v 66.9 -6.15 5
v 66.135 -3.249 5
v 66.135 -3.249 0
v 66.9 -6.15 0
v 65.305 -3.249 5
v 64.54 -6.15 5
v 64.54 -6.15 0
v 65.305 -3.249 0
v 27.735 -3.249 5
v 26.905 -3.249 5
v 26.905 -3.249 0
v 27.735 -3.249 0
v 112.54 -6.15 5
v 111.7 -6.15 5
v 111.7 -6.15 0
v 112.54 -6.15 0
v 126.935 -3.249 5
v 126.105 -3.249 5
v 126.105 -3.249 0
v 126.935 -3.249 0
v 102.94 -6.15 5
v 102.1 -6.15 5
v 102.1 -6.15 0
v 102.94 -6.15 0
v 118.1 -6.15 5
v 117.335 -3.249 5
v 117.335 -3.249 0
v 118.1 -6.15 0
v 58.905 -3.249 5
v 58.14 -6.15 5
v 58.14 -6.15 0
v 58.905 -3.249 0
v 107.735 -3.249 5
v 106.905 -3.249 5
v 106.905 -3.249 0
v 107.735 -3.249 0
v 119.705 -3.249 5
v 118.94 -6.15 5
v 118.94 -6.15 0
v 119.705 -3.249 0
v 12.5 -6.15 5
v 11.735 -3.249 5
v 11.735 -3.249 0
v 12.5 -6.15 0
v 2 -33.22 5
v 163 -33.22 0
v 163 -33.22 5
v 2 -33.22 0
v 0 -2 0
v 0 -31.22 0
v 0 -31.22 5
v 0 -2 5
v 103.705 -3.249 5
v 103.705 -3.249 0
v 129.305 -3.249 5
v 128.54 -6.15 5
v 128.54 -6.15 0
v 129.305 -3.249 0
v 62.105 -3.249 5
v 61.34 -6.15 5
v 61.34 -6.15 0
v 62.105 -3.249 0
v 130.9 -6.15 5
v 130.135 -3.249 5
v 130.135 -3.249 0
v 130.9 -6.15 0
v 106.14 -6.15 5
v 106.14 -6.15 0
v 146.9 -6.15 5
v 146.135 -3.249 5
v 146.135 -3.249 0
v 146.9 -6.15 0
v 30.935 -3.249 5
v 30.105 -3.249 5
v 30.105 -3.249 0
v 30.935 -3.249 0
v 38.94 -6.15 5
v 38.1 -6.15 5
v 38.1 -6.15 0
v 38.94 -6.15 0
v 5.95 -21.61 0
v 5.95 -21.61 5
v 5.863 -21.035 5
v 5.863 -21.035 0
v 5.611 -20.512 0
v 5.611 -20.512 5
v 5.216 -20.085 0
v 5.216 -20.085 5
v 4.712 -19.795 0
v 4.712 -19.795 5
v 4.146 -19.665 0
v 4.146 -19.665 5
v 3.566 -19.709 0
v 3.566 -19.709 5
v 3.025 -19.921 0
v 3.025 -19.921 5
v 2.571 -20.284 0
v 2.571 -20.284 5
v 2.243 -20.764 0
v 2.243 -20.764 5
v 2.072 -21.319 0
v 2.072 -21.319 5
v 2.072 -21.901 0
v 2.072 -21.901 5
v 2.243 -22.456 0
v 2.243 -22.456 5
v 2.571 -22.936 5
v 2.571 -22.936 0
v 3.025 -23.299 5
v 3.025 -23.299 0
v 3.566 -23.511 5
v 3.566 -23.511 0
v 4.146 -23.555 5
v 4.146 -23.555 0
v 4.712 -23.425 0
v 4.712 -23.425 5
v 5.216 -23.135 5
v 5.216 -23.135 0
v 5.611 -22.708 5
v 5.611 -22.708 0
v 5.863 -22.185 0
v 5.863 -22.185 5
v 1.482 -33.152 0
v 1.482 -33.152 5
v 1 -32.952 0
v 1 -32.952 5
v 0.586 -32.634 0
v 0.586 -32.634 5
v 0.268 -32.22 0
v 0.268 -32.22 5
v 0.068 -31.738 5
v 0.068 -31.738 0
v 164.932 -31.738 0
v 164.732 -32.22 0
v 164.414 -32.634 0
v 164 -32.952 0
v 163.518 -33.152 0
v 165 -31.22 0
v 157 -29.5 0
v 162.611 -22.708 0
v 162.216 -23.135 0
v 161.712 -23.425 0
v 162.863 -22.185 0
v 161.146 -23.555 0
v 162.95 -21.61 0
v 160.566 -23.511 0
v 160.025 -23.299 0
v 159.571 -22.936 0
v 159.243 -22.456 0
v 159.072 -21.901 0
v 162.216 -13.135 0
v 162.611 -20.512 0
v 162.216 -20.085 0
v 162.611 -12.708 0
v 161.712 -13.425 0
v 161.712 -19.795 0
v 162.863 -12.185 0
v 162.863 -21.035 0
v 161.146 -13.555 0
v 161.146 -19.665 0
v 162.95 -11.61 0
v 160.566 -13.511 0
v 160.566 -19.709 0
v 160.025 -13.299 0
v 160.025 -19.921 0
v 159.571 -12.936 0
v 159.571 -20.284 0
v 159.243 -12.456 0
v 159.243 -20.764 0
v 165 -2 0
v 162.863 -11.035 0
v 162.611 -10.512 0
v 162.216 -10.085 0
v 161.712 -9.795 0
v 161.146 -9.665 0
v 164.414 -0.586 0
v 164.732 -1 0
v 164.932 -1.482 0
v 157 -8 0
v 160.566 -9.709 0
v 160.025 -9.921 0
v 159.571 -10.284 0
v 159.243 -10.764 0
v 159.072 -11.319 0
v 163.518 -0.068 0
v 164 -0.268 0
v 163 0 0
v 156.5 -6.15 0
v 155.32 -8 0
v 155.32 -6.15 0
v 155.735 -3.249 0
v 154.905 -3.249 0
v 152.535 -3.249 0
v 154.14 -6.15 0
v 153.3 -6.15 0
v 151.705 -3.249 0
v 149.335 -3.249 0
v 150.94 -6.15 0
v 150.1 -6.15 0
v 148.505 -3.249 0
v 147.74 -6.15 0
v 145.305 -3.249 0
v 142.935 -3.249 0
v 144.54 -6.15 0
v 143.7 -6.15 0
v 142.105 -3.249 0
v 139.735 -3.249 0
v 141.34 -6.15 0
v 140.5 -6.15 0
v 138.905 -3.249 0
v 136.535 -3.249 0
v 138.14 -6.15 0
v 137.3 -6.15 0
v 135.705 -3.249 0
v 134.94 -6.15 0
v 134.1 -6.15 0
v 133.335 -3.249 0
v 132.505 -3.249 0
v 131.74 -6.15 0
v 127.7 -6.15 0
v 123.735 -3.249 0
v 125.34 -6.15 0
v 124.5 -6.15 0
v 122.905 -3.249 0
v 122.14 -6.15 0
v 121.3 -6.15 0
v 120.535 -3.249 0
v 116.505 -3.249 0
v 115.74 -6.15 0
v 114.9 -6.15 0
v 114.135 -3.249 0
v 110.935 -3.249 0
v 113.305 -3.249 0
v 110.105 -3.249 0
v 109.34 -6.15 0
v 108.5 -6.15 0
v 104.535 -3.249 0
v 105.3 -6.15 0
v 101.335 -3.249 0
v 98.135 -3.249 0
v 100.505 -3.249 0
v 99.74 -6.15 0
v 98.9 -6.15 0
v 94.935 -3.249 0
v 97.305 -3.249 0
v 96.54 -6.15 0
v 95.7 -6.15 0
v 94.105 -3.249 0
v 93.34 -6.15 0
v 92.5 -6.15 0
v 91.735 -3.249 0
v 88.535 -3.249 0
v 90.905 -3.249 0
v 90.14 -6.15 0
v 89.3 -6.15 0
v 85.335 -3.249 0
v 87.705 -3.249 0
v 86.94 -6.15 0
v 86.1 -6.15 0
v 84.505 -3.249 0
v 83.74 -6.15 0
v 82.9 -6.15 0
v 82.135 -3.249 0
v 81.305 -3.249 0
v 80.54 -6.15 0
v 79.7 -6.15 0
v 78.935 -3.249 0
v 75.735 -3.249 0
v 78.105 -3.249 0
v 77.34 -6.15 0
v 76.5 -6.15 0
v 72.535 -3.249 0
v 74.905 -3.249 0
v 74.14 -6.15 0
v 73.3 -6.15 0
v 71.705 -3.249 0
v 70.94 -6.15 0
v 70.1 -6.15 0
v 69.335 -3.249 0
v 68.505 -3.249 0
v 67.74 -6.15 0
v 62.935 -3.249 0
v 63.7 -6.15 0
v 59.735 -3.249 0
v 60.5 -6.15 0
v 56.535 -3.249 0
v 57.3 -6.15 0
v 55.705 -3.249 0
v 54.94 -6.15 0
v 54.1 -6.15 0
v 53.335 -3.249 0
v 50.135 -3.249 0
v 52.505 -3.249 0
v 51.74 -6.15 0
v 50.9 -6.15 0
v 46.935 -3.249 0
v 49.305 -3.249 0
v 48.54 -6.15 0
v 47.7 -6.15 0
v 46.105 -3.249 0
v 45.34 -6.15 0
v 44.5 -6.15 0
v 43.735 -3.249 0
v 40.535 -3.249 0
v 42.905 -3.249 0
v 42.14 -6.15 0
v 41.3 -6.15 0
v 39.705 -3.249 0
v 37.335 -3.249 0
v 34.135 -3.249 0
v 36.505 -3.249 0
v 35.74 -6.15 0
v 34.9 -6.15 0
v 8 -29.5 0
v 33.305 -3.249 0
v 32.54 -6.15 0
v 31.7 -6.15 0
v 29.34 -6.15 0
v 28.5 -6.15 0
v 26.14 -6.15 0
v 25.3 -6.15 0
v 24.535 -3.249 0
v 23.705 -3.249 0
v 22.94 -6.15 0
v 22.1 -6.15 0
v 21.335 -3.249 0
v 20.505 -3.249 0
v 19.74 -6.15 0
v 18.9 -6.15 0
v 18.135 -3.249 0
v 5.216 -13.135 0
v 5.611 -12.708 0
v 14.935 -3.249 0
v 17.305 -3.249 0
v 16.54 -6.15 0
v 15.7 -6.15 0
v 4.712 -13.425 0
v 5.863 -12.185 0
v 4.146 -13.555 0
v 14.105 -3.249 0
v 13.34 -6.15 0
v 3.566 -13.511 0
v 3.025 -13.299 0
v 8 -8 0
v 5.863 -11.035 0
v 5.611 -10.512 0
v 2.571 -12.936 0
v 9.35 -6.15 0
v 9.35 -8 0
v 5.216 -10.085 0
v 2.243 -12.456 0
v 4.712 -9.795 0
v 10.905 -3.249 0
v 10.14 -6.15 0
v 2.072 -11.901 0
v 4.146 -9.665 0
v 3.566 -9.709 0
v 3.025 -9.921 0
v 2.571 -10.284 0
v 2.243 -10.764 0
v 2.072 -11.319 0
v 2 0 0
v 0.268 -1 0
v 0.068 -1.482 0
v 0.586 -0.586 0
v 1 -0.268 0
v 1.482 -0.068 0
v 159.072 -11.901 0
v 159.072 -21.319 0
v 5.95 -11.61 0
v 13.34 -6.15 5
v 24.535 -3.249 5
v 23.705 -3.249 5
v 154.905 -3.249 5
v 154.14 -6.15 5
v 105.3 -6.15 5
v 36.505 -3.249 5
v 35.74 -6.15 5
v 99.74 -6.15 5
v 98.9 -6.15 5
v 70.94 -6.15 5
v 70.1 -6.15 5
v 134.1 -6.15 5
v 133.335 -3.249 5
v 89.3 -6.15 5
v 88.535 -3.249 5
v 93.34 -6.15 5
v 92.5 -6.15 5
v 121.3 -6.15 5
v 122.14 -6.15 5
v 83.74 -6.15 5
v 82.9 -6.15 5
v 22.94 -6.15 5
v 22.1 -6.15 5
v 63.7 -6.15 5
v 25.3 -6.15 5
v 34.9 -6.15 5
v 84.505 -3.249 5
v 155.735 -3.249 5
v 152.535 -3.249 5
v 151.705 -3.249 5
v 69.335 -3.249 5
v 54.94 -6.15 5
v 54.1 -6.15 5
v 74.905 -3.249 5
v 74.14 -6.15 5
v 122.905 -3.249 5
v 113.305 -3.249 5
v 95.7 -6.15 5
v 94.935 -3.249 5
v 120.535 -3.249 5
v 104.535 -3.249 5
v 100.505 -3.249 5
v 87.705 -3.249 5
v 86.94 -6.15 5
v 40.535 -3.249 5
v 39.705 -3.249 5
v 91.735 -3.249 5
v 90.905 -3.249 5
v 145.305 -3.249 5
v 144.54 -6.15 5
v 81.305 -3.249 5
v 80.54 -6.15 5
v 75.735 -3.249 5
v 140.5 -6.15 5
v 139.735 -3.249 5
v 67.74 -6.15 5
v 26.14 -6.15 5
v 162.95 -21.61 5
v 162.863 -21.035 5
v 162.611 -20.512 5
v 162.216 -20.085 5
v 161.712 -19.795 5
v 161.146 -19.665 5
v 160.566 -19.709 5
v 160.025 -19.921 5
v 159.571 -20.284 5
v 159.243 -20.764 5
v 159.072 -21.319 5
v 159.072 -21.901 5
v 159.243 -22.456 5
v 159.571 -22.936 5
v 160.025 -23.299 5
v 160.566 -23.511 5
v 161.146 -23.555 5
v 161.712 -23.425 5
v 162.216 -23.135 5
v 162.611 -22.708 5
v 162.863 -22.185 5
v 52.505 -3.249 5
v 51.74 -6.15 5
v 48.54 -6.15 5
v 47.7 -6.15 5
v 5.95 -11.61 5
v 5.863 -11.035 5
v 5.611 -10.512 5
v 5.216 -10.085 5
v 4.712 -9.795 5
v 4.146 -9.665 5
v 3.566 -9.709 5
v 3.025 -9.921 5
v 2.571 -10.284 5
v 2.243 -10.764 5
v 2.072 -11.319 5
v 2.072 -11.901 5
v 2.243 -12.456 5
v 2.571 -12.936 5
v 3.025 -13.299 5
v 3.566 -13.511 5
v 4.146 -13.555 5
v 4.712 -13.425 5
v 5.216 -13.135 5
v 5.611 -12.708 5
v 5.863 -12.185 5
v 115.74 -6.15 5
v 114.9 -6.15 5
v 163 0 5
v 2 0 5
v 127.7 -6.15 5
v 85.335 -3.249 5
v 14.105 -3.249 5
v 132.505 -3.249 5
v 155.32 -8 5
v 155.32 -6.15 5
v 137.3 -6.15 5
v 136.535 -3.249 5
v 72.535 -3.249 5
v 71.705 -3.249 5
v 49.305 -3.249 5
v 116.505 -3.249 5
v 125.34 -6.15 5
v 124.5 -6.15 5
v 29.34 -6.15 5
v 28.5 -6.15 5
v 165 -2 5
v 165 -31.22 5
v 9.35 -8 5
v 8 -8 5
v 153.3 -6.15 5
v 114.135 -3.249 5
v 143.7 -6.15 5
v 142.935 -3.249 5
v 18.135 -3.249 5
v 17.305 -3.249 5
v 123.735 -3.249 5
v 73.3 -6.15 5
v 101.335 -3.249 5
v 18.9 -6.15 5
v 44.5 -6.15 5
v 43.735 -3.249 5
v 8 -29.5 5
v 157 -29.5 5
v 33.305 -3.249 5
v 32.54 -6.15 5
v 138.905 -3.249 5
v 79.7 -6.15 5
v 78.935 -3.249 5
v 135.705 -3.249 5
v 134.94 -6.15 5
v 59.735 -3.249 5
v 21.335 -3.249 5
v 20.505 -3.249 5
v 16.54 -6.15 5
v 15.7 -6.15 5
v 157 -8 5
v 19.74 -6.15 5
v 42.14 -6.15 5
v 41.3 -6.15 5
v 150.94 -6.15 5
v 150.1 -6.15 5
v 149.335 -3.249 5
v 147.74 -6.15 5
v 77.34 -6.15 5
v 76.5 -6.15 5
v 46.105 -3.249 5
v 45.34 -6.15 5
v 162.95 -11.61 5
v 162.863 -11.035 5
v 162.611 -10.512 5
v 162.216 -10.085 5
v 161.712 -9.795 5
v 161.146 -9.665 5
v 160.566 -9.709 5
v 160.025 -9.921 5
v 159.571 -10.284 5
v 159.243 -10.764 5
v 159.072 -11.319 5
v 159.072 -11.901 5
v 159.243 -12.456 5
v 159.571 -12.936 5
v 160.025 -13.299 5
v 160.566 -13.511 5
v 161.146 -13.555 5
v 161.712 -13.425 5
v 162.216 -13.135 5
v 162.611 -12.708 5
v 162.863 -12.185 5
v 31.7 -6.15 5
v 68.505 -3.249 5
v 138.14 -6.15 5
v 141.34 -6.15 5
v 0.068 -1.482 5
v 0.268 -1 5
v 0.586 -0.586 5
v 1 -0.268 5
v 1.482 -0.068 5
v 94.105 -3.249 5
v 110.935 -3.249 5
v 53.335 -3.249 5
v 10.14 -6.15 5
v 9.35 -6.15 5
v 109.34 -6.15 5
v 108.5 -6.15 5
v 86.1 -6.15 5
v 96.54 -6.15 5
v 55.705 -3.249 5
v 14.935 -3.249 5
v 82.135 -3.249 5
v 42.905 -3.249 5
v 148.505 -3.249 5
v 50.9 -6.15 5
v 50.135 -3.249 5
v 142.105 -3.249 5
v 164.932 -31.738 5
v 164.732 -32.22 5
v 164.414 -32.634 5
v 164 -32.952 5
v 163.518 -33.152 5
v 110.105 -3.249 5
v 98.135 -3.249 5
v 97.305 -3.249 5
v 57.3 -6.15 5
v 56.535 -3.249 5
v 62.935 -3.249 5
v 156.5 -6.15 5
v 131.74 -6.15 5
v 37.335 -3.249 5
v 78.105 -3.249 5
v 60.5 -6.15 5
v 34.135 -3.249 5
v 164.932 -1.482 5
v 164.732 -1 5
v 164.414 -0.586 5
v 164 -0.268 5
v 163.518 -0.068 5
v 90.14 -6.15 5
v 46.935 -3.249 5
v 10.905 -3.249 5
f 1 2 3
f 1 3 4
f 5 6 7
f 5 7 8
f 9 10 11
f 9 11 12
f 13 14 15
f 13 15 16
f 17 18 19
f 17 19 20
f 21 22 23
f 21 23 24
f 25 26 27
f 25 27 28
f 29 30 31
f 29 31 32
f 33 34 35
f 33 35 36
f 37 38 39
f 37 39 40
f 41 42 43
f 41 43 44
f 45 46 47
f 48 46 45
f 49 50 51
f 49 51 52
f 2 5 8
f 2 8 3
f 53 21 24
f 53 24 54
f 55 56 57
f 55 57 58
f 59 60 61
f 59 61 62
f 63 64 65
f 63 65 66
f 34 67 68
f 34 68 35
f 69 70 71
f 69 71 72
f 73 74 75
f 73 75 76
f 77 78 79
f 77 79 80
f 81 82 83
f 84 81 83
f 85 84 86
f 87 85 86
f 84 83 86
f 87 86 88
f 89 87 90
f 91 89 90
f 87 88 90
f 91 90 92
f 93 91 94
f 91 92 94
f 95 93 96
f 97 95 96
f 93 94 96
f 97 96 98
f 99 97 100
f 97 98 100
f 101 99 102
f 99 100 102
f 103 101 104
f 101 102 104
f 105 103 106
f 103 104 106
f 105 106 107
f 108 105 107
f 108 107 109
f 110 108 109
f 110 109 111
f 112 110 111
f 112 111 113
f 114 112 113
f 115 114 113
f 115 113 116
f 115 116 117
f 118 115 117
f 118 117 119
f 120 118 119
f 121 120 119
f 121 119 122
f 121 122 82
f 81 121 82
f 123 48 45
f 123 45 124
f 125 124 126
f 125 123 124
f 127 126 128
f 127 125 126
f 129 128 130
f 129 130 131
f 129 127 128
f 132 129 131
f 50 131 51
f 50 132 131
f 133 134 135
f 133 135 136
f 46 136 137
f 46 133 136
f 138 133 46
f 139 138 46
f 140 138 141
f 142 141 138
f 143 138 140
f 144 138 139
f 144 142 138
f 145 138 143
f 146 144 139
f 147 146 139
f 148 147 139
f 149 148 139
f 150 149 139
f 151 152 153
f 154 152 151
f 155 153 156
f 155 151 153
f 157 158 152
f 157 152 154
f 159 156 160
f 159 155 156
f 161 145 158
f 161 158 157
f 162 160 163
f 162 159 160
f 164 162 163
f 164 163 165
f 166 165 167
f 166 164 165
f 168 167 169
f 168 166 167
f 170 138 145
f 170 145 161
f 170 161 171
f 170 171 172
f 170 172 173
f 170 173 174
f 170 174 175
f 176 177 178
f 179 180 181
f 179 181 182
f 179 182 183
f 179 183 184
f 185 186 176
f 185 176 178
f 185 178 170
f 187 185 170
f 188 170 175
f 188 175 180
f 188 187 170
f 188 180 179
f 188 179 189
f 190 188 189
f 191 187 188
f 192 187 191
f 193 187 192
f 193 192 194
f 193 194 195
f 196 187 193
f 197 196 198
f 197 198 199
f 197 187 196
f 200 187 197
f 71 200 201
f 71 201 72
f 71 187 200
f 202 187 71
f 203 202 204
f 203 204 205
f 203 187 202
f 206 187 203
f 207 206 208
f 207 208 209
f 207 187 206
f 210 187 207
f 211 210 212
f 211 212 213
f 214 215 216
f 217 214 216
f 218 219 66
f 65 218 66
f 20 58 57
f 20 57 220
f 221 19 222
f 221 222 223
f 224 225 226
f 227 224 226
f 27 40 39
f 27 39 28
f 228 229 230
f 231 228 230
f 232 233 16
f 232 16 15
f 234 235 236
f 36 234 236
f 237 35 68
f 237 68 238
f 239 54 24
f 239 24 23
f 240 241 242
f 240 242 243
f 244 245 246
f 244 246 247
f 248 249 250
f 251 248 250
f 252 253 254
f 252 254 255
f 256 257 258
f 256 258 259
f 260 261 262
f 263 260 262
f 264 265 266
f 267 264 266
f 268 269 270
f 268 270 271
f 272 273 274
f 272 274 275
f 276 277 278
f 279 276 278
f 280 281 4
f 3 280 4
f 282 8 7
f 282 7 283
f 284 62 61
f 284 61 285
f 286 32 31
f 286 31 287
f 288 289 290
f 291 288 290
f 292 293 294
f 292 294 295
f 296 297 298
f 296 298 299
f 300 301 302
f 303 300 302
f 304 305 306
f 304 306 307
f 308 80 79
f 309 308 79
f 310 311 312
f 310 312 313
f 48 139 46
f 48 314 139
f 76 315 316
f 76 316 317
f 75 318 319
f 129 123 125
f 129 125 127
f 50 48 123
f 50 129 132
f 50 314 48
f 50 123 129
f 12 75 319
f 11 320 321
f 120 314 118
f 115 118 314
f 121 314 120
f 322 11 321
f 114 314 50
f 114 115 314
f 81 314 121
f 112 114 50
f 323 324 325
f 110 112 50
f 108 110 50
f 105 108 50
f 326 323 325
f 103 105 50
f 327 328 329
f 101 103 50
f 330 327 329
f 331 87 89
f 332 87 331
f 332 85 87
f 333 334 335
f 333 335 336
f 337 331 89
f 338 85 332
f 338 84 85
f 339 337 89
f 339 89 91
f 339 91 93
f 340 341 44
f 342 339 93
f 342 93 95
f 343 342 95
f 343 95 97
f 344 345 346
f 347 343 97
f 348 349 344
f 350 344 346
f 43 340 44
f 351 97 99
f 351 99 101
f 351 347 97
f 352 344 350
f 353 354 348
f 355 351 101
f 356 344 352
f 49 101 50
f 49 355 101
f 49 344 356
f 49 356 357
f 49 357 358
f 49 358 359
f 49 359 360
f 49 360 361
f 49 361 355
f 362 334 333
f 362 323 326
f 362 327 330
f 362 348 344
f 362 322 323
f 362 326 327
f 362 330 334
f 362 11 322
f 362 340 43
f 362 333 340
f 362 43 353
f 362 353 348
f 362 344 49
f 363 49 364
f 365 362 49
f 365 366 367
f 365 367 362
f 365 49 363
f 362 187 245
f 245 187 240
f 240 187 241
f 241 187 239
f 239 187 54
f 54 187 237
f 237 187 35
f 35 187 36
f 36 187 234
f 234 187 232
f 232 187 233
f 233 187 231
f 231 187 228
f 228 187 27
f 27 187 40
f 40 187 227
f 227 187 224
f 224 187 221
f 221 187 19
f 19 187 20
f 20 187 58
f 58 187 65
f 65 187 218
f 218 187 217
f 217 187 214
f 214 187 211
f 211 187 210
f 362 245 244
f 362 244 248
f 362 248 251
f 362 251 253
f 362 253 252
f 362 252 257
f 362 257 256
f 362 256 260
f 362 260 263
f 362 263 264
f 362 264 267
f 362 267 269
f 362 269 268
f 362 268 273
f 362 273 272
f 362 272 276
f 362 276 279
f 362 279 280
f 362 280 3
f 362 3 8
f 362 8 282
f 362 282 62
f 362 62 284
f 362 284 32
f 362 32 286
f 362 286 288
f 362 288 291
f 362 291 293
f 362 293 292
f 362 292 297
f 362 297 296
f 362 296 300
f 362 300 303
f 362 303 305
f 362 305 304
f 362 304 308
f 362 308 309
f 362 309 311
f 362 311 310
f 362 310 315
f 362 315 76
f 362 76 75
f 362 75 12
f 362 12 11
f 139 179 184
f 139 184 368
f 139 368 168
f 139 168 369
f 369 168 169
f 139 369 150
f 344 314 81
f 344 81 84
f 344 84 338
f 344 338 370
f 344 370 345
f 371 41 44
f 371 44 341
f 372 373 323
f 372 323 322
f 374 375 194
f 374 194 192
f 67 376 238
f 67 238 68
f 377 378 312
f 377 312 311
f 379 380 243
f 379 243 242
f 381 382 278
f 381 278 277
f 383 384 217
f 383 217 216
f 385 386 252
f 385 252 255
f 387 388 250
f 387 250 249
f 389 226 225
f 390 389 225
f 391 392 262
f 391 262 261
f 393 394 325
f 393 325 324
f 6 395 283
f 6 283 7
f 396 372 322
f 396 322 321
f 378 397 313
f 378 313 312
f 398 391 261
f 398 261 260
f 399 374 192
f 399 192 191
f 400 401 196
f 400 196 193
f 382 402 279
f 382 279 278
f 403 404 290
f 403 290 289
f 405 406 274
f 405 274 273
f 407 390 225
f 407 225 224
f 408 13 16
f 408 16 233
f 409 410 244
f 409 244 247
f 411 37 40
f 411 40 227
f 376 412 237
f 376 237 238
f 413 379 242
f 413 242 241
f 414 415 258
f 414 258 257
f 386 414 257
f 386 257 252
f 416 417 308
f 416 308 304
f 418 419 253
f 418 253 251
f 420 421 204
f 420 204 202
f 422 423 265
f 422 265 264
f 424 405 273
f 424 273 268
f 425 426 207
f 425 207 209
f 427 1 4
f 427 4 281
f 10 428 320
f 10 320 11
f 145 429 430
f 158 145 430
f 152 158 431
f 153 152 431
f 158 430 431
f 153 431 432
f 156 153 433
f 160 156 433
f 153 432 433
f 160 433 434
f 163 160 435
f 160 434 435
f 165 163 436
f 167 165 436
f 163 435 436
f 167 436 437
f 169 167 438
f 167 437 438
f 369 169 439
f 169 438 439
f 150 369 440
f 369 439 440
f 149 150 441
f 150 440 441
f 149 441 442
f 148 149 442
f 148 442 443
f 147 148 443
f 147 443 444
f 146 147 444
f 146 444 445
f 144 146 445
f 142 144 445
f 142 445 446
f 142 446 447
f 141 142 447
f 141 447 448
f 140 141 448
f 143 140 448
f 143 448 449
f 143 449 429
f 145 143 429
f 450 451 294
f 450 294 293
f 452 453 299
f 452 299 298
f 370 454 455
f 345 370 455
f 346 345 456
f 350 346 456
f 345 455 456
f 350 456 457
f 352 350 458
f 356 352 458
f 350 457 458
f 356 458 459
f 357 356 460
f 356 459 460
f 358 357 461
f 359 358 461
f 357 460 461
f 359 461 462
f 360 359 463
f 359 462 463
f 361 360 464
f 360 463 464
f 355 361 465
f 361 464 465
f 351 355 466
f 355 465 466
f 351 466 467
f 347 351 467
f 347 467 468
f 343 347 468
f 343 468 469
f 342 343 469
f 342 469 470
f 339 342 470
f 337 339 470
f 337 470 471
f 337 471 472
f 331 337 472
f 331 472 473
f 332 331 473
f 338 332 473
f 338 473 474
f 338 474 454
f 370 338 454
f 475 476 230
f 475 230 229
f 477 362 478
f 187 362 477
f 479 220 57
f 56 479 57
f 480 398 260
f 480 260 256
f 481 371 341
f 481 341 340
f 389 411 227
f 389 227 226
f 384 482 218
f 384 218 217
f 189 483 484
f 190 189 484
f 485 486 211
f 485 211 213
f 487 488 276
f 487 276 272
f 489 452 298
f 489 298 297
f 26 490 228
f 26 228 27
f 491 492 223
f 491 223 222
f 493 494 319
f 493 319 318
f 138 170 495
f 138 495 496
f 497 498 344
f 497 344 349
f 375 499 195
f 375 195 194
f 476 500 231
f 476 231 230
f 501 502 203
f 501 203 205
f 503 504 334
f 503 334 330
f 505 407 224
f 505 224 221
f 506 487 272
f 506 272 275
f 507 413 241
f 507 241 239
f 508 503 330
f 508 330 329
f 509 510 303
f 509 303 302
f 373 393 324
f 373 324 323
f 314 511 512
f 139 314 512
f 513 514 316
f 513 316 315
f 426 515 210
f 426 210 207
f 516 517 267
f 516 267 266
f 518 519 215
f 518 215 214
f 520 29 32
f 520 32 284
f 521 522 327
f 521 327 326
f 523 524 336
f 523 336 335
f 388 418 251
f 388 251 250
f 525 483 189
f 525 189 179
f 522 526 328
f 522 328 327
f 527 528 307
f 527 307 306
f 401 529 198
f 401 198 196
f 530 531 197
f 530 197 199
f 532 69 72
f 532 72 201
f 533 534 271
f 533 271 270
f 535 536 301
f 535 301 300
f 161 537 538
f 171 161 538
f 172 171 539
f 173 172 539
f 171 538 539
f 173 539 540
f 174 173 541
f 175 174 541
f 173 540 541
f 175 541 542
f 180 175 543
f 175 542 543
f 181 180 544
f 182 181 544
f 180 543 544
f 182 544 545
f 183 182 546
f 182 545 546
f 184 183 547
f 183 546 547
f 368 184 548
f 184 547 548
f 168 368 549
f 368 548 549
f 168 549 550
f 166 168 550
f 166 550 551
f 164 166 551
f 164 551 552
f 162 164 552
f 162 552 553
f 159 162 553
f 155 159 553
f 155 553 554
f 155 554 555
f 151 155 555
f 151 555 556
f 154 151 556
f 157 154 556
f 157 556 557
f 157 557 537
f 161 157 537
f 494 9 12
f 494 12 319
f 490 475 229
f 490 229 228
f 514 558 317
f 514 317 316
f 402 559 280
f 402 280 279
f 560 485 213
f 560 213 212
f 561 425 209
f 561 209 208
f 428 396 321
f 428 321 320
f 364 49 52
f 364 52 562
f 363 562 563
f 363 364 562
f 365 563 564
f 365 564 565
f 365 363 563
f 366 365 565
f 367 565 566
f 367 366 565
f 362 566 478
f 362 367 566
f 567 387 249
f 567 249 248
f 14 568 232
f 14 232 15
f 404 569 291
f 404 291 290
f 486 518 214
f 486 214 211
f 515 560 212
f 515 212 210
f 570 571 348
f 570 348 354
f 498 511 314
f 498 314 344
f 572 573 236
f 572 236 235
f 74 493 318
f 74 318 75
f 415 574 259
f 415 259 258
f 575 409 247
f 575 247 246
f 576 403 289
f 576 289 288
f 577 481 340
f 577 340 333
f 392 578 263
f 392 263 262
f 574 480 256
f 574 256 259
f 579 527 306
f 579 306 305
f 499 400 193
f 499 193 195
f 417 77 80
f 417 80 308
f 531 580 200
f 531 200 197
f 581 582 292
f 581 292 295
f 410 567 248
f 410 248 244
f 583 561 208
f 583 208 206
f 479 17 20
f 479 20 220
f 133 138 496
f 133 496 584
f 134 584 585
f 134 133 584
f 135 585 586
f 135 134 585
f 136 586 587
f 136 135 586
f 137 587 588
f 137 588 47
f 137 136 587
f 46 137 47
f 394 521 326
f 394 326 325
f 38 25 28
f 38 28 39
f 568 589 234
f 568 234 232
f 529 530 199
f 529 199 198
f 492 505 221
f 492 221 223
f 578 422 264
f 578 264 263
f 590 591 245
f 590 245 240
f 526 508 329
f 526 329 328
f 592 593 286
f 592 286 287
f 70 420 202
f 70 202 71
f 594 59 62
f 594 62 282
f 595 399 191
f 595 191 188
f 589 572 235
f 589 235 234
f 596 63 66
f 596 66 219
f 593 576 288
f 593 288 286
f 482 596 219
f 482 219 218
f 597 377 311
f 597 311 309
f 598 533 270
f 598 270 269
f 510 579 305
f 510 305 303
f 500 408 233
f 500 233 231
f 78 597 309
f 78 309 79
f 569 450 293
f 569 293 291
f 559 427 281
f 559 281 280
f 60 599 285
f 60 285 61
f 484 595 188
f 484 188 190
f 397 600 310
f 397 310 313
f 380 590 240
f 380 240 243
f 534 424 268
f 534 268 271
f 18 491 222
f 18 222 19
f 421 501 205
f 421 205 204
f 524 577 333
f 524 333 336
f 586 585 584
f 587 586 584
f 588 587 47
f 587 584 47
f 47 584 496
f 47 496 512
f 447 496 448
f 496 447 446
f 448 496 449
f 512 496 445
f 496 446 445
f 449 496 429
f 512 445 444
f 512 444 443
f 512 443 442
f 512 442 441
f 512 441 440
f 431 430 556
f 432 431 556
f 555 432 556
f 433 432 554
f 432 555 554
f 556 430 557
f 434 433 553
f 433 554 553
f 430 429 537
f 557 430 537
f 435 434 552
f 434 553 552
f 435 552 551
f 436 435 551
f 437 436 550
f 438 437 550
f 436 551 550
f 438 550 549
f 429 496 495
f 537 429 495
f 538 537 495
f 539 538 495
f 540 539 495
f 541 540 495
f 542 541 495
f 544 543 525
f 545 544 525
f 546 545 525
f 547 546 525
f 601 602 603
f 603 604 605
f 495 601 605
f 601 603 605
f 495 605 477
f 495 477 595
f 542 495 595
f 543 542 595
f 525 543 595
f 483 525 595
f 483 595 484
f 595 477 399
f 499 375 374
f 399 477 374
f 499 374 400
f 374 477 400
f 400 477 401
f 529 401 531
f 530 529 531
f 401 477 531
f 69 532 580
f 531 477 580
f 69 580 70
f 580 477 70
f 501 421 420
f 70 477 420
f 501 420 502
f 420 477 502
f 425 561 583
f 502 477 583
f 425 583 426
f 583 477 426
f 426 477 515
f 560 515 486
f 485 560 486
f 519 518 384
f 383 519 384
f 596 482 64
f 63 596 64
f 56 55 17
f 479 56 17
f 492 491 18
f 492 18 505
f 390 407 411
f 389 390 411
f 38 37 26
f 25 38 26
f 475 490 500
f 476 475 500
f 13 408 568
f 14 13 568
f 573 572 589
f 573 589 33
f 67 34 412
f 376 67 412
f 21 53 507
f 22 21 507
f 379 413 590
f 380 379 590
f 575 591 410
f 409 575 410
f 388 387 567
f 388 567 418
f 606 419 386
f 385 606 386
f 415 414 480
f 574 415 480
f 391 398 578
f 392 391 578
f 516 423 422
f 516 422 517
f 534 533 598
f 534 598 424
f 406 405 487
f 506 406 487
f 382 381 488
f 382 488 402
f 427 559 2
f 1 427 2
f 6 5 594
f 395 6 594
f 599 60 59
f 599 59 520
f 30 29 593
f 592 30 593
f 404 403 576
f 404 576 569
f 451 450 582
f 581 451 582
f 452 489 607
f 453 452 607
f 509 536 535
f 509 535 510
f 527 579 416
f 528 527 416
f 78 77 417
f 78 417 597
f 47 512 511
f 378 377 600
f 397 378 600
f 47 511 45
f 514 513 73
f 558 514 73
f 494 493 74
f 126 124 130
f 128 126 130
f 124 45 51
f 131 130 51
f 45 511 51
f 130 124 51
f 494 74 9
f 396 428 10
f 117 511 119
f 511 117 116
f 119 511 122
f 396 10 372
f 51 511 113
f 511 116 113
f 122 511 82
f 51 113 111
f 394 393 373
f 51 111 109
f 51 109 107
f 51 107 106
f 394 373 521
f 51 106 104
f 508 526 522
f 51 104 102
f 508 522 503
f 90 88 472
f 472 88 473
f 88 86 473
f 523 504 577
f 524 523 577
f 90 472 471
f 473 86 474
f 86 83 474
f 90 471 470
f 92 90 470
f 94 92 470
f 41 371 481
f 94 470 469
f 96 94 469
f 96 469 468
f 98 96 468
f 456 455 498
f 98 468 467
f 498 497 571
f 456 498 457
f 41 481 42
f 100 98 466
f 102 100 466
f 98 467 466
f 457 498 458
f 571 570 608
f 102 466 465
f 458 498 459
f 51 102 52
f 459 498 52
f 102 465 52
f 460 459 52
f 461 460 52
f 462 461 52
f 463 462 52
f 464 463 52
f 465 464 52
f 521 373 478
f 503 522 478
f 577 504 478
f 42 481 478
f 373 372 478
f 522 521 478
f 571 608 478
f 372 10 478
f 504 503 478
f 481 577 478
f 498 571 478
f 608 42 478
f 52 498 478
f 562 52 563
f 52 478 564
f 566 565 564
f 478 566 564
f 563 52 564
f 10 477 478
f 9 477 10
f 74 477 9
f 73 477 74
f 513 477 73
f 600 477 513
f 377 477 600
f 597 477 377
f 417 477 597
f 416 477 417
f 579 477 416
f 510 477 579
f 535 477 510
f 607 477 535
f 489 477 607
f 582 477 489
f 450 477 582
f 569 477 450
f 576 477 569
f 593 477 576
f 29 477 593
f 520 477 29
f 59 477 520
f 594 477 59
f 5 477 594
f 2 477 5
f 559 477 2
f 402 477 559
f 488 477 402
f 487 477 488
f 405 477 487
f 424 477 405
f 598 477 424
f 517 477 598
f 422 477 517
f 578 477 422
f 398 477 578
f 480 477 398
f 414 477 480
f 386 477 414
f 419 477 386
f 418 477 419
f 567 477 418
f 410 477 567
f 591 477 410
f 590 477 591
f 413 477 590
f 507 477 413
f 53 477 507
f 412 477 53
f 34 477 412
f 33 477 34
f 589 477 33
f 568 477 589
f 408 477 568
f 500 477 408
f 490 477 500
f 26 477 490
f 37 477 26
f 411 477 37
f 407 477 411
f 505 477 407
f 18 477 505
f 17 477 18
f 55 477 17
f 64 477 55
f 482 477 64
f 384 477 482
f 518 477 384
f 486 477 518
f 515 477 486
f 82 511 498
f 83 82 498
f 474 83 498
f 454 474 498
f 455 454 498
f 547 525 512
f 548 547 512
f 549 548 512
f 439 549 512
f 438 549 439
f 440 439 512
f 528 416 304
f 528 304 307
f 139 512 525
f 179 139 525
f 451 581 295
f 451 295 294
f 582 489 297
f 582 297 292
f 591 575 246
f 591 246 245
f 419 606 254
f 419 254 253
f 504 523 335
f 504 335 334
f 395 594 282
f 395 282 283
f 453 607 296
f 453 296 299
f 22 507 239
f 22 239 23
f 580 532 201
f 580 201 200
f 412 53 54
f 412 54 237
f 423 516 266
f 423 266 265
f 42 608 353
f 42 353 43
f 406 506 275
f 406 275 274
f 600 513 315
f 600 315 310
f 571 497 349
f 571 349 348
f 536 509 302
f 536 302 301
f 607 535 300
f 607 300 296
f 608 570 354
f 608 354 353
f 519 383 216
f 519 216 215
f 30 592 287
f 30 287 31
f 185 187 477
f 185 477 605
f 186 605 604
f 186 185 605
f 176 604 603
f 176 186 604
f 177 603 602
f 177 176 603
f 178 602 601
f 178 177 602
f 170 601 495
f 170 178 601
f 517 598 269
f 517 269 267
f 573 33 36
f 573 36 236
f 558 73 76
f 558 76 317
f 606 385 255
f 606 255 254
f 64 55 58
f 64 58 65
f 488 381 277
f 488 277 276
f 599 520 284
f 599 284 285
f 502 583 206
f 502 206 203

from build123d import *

# Parameters (mm, degrees)
BOSS_EXTRUDE1_DEPTH = 5
SKETCH2_W           = 149
SKETCH2_H           = 21.5
CUT_EXTRUDE1_DEPTH  = 6
SKETCH3_W           = 145.97
SKETCH3_H           = 1.85
CUT_EXTRUDE2_DEPTH  = 6
CUT_EXTRUDE4_DEPTH  = 6
LPATTERN1_COUNT     = 46
LPATTERN1_PITCH     = 3.2
SKETCH5_R           = 1.95
CUT_EXTRUDE5_DEPTH  = 10


with BuildPart() as part:
    # Sketch1 → Boss-Extrude1 (new body)
    with BuildSketch(Plane.XY):
        with BuildLine():
            Line((2, 0), (163, 0))
            ThreePointArc((163, 0), (164.414213562, -0.585786438), (165, -2))
            Line((165, -2), (165, -31.22))
            ThreePointArc((165, -31.22), (164.414213562, -32.634213562), (163, -33.22))
            Line((163, -33.22), (2, -33.22))
            ThreePointArc((2, -33.22), (0.585786438, -32.634213562), (0, -31.22))
            Line((0, -31.22), (0, -2))
            ThreePointArc((0, -2), (0.585786438, -0.585786438), (2, 0))
        make_face()
    extrude(amount=BOSS_EXTRUDE1_DEPTH)

    # Sketch2 → Cut-Extrude1 (cut, through all)
    with BuildSketch(Plane.XY.offset(5)):
        with Locations((82.5, -18.75)):
            Rectangle(SKETCH2_W, SKETCH2_H)
    extrude(amount=-CUT_EXTRUDE1_DEPTH, mode=Mode.SUBTRACT)

    # Sketch3 → Cut-Extrude2 (cut, through all)
    with BuildSketch(Plane.XY.offset(5)):
        with Locations((82.335, -7.075)):
            Rectangle(SKETCH3_W, SKETCH3_H)
    extrude(amount=-CUT_EXTRUDE2_DEPTH, mode=Mode.SUBTRACT)

    # Sketch4 → Cut-Extrude4 (cut, through all)
    with BuildSketch(Plane.XY.offset(5)):
        Polygon((155.735, -3.249176841), (156.5, -6.15), (154.14, -6.15), (154.905, -3.249176841), align=None)
    cut_extrude4 = extrude(amount=-CUT_EXTRUDE4_DEPTH, mode=Mode.SUBTRACT)

    # LPattern1: Cut-Extrude4 ×46
    with Locations(*[(-i * LPATTERN1_PITCH, 0, 0) for i in range(1, LPATTERN1_COUNT)]):
        add(cut_extrude4, mode=Mode.SUBTRACT)

    # Sketch5 → Cut-Extrude5 (cut)
    with BuildSketch(Plane.XY.offset(5)):
        with Locations((4, -11.61)):
            Circle(SKETCH5_R)
        with Locations((4, -21.61)):
            Circle(SKETCH5_R)
        with Locations((161, -11.61)):
            Circle(SKETCH5_R)
        with Locations((161, -21.61)):
            Circle(SKETCH5_R)
    extrude(amount=-CUT_EXTRUDE5_DEPTH, mode=Mode.SUBTRACT)


solid = part.part
